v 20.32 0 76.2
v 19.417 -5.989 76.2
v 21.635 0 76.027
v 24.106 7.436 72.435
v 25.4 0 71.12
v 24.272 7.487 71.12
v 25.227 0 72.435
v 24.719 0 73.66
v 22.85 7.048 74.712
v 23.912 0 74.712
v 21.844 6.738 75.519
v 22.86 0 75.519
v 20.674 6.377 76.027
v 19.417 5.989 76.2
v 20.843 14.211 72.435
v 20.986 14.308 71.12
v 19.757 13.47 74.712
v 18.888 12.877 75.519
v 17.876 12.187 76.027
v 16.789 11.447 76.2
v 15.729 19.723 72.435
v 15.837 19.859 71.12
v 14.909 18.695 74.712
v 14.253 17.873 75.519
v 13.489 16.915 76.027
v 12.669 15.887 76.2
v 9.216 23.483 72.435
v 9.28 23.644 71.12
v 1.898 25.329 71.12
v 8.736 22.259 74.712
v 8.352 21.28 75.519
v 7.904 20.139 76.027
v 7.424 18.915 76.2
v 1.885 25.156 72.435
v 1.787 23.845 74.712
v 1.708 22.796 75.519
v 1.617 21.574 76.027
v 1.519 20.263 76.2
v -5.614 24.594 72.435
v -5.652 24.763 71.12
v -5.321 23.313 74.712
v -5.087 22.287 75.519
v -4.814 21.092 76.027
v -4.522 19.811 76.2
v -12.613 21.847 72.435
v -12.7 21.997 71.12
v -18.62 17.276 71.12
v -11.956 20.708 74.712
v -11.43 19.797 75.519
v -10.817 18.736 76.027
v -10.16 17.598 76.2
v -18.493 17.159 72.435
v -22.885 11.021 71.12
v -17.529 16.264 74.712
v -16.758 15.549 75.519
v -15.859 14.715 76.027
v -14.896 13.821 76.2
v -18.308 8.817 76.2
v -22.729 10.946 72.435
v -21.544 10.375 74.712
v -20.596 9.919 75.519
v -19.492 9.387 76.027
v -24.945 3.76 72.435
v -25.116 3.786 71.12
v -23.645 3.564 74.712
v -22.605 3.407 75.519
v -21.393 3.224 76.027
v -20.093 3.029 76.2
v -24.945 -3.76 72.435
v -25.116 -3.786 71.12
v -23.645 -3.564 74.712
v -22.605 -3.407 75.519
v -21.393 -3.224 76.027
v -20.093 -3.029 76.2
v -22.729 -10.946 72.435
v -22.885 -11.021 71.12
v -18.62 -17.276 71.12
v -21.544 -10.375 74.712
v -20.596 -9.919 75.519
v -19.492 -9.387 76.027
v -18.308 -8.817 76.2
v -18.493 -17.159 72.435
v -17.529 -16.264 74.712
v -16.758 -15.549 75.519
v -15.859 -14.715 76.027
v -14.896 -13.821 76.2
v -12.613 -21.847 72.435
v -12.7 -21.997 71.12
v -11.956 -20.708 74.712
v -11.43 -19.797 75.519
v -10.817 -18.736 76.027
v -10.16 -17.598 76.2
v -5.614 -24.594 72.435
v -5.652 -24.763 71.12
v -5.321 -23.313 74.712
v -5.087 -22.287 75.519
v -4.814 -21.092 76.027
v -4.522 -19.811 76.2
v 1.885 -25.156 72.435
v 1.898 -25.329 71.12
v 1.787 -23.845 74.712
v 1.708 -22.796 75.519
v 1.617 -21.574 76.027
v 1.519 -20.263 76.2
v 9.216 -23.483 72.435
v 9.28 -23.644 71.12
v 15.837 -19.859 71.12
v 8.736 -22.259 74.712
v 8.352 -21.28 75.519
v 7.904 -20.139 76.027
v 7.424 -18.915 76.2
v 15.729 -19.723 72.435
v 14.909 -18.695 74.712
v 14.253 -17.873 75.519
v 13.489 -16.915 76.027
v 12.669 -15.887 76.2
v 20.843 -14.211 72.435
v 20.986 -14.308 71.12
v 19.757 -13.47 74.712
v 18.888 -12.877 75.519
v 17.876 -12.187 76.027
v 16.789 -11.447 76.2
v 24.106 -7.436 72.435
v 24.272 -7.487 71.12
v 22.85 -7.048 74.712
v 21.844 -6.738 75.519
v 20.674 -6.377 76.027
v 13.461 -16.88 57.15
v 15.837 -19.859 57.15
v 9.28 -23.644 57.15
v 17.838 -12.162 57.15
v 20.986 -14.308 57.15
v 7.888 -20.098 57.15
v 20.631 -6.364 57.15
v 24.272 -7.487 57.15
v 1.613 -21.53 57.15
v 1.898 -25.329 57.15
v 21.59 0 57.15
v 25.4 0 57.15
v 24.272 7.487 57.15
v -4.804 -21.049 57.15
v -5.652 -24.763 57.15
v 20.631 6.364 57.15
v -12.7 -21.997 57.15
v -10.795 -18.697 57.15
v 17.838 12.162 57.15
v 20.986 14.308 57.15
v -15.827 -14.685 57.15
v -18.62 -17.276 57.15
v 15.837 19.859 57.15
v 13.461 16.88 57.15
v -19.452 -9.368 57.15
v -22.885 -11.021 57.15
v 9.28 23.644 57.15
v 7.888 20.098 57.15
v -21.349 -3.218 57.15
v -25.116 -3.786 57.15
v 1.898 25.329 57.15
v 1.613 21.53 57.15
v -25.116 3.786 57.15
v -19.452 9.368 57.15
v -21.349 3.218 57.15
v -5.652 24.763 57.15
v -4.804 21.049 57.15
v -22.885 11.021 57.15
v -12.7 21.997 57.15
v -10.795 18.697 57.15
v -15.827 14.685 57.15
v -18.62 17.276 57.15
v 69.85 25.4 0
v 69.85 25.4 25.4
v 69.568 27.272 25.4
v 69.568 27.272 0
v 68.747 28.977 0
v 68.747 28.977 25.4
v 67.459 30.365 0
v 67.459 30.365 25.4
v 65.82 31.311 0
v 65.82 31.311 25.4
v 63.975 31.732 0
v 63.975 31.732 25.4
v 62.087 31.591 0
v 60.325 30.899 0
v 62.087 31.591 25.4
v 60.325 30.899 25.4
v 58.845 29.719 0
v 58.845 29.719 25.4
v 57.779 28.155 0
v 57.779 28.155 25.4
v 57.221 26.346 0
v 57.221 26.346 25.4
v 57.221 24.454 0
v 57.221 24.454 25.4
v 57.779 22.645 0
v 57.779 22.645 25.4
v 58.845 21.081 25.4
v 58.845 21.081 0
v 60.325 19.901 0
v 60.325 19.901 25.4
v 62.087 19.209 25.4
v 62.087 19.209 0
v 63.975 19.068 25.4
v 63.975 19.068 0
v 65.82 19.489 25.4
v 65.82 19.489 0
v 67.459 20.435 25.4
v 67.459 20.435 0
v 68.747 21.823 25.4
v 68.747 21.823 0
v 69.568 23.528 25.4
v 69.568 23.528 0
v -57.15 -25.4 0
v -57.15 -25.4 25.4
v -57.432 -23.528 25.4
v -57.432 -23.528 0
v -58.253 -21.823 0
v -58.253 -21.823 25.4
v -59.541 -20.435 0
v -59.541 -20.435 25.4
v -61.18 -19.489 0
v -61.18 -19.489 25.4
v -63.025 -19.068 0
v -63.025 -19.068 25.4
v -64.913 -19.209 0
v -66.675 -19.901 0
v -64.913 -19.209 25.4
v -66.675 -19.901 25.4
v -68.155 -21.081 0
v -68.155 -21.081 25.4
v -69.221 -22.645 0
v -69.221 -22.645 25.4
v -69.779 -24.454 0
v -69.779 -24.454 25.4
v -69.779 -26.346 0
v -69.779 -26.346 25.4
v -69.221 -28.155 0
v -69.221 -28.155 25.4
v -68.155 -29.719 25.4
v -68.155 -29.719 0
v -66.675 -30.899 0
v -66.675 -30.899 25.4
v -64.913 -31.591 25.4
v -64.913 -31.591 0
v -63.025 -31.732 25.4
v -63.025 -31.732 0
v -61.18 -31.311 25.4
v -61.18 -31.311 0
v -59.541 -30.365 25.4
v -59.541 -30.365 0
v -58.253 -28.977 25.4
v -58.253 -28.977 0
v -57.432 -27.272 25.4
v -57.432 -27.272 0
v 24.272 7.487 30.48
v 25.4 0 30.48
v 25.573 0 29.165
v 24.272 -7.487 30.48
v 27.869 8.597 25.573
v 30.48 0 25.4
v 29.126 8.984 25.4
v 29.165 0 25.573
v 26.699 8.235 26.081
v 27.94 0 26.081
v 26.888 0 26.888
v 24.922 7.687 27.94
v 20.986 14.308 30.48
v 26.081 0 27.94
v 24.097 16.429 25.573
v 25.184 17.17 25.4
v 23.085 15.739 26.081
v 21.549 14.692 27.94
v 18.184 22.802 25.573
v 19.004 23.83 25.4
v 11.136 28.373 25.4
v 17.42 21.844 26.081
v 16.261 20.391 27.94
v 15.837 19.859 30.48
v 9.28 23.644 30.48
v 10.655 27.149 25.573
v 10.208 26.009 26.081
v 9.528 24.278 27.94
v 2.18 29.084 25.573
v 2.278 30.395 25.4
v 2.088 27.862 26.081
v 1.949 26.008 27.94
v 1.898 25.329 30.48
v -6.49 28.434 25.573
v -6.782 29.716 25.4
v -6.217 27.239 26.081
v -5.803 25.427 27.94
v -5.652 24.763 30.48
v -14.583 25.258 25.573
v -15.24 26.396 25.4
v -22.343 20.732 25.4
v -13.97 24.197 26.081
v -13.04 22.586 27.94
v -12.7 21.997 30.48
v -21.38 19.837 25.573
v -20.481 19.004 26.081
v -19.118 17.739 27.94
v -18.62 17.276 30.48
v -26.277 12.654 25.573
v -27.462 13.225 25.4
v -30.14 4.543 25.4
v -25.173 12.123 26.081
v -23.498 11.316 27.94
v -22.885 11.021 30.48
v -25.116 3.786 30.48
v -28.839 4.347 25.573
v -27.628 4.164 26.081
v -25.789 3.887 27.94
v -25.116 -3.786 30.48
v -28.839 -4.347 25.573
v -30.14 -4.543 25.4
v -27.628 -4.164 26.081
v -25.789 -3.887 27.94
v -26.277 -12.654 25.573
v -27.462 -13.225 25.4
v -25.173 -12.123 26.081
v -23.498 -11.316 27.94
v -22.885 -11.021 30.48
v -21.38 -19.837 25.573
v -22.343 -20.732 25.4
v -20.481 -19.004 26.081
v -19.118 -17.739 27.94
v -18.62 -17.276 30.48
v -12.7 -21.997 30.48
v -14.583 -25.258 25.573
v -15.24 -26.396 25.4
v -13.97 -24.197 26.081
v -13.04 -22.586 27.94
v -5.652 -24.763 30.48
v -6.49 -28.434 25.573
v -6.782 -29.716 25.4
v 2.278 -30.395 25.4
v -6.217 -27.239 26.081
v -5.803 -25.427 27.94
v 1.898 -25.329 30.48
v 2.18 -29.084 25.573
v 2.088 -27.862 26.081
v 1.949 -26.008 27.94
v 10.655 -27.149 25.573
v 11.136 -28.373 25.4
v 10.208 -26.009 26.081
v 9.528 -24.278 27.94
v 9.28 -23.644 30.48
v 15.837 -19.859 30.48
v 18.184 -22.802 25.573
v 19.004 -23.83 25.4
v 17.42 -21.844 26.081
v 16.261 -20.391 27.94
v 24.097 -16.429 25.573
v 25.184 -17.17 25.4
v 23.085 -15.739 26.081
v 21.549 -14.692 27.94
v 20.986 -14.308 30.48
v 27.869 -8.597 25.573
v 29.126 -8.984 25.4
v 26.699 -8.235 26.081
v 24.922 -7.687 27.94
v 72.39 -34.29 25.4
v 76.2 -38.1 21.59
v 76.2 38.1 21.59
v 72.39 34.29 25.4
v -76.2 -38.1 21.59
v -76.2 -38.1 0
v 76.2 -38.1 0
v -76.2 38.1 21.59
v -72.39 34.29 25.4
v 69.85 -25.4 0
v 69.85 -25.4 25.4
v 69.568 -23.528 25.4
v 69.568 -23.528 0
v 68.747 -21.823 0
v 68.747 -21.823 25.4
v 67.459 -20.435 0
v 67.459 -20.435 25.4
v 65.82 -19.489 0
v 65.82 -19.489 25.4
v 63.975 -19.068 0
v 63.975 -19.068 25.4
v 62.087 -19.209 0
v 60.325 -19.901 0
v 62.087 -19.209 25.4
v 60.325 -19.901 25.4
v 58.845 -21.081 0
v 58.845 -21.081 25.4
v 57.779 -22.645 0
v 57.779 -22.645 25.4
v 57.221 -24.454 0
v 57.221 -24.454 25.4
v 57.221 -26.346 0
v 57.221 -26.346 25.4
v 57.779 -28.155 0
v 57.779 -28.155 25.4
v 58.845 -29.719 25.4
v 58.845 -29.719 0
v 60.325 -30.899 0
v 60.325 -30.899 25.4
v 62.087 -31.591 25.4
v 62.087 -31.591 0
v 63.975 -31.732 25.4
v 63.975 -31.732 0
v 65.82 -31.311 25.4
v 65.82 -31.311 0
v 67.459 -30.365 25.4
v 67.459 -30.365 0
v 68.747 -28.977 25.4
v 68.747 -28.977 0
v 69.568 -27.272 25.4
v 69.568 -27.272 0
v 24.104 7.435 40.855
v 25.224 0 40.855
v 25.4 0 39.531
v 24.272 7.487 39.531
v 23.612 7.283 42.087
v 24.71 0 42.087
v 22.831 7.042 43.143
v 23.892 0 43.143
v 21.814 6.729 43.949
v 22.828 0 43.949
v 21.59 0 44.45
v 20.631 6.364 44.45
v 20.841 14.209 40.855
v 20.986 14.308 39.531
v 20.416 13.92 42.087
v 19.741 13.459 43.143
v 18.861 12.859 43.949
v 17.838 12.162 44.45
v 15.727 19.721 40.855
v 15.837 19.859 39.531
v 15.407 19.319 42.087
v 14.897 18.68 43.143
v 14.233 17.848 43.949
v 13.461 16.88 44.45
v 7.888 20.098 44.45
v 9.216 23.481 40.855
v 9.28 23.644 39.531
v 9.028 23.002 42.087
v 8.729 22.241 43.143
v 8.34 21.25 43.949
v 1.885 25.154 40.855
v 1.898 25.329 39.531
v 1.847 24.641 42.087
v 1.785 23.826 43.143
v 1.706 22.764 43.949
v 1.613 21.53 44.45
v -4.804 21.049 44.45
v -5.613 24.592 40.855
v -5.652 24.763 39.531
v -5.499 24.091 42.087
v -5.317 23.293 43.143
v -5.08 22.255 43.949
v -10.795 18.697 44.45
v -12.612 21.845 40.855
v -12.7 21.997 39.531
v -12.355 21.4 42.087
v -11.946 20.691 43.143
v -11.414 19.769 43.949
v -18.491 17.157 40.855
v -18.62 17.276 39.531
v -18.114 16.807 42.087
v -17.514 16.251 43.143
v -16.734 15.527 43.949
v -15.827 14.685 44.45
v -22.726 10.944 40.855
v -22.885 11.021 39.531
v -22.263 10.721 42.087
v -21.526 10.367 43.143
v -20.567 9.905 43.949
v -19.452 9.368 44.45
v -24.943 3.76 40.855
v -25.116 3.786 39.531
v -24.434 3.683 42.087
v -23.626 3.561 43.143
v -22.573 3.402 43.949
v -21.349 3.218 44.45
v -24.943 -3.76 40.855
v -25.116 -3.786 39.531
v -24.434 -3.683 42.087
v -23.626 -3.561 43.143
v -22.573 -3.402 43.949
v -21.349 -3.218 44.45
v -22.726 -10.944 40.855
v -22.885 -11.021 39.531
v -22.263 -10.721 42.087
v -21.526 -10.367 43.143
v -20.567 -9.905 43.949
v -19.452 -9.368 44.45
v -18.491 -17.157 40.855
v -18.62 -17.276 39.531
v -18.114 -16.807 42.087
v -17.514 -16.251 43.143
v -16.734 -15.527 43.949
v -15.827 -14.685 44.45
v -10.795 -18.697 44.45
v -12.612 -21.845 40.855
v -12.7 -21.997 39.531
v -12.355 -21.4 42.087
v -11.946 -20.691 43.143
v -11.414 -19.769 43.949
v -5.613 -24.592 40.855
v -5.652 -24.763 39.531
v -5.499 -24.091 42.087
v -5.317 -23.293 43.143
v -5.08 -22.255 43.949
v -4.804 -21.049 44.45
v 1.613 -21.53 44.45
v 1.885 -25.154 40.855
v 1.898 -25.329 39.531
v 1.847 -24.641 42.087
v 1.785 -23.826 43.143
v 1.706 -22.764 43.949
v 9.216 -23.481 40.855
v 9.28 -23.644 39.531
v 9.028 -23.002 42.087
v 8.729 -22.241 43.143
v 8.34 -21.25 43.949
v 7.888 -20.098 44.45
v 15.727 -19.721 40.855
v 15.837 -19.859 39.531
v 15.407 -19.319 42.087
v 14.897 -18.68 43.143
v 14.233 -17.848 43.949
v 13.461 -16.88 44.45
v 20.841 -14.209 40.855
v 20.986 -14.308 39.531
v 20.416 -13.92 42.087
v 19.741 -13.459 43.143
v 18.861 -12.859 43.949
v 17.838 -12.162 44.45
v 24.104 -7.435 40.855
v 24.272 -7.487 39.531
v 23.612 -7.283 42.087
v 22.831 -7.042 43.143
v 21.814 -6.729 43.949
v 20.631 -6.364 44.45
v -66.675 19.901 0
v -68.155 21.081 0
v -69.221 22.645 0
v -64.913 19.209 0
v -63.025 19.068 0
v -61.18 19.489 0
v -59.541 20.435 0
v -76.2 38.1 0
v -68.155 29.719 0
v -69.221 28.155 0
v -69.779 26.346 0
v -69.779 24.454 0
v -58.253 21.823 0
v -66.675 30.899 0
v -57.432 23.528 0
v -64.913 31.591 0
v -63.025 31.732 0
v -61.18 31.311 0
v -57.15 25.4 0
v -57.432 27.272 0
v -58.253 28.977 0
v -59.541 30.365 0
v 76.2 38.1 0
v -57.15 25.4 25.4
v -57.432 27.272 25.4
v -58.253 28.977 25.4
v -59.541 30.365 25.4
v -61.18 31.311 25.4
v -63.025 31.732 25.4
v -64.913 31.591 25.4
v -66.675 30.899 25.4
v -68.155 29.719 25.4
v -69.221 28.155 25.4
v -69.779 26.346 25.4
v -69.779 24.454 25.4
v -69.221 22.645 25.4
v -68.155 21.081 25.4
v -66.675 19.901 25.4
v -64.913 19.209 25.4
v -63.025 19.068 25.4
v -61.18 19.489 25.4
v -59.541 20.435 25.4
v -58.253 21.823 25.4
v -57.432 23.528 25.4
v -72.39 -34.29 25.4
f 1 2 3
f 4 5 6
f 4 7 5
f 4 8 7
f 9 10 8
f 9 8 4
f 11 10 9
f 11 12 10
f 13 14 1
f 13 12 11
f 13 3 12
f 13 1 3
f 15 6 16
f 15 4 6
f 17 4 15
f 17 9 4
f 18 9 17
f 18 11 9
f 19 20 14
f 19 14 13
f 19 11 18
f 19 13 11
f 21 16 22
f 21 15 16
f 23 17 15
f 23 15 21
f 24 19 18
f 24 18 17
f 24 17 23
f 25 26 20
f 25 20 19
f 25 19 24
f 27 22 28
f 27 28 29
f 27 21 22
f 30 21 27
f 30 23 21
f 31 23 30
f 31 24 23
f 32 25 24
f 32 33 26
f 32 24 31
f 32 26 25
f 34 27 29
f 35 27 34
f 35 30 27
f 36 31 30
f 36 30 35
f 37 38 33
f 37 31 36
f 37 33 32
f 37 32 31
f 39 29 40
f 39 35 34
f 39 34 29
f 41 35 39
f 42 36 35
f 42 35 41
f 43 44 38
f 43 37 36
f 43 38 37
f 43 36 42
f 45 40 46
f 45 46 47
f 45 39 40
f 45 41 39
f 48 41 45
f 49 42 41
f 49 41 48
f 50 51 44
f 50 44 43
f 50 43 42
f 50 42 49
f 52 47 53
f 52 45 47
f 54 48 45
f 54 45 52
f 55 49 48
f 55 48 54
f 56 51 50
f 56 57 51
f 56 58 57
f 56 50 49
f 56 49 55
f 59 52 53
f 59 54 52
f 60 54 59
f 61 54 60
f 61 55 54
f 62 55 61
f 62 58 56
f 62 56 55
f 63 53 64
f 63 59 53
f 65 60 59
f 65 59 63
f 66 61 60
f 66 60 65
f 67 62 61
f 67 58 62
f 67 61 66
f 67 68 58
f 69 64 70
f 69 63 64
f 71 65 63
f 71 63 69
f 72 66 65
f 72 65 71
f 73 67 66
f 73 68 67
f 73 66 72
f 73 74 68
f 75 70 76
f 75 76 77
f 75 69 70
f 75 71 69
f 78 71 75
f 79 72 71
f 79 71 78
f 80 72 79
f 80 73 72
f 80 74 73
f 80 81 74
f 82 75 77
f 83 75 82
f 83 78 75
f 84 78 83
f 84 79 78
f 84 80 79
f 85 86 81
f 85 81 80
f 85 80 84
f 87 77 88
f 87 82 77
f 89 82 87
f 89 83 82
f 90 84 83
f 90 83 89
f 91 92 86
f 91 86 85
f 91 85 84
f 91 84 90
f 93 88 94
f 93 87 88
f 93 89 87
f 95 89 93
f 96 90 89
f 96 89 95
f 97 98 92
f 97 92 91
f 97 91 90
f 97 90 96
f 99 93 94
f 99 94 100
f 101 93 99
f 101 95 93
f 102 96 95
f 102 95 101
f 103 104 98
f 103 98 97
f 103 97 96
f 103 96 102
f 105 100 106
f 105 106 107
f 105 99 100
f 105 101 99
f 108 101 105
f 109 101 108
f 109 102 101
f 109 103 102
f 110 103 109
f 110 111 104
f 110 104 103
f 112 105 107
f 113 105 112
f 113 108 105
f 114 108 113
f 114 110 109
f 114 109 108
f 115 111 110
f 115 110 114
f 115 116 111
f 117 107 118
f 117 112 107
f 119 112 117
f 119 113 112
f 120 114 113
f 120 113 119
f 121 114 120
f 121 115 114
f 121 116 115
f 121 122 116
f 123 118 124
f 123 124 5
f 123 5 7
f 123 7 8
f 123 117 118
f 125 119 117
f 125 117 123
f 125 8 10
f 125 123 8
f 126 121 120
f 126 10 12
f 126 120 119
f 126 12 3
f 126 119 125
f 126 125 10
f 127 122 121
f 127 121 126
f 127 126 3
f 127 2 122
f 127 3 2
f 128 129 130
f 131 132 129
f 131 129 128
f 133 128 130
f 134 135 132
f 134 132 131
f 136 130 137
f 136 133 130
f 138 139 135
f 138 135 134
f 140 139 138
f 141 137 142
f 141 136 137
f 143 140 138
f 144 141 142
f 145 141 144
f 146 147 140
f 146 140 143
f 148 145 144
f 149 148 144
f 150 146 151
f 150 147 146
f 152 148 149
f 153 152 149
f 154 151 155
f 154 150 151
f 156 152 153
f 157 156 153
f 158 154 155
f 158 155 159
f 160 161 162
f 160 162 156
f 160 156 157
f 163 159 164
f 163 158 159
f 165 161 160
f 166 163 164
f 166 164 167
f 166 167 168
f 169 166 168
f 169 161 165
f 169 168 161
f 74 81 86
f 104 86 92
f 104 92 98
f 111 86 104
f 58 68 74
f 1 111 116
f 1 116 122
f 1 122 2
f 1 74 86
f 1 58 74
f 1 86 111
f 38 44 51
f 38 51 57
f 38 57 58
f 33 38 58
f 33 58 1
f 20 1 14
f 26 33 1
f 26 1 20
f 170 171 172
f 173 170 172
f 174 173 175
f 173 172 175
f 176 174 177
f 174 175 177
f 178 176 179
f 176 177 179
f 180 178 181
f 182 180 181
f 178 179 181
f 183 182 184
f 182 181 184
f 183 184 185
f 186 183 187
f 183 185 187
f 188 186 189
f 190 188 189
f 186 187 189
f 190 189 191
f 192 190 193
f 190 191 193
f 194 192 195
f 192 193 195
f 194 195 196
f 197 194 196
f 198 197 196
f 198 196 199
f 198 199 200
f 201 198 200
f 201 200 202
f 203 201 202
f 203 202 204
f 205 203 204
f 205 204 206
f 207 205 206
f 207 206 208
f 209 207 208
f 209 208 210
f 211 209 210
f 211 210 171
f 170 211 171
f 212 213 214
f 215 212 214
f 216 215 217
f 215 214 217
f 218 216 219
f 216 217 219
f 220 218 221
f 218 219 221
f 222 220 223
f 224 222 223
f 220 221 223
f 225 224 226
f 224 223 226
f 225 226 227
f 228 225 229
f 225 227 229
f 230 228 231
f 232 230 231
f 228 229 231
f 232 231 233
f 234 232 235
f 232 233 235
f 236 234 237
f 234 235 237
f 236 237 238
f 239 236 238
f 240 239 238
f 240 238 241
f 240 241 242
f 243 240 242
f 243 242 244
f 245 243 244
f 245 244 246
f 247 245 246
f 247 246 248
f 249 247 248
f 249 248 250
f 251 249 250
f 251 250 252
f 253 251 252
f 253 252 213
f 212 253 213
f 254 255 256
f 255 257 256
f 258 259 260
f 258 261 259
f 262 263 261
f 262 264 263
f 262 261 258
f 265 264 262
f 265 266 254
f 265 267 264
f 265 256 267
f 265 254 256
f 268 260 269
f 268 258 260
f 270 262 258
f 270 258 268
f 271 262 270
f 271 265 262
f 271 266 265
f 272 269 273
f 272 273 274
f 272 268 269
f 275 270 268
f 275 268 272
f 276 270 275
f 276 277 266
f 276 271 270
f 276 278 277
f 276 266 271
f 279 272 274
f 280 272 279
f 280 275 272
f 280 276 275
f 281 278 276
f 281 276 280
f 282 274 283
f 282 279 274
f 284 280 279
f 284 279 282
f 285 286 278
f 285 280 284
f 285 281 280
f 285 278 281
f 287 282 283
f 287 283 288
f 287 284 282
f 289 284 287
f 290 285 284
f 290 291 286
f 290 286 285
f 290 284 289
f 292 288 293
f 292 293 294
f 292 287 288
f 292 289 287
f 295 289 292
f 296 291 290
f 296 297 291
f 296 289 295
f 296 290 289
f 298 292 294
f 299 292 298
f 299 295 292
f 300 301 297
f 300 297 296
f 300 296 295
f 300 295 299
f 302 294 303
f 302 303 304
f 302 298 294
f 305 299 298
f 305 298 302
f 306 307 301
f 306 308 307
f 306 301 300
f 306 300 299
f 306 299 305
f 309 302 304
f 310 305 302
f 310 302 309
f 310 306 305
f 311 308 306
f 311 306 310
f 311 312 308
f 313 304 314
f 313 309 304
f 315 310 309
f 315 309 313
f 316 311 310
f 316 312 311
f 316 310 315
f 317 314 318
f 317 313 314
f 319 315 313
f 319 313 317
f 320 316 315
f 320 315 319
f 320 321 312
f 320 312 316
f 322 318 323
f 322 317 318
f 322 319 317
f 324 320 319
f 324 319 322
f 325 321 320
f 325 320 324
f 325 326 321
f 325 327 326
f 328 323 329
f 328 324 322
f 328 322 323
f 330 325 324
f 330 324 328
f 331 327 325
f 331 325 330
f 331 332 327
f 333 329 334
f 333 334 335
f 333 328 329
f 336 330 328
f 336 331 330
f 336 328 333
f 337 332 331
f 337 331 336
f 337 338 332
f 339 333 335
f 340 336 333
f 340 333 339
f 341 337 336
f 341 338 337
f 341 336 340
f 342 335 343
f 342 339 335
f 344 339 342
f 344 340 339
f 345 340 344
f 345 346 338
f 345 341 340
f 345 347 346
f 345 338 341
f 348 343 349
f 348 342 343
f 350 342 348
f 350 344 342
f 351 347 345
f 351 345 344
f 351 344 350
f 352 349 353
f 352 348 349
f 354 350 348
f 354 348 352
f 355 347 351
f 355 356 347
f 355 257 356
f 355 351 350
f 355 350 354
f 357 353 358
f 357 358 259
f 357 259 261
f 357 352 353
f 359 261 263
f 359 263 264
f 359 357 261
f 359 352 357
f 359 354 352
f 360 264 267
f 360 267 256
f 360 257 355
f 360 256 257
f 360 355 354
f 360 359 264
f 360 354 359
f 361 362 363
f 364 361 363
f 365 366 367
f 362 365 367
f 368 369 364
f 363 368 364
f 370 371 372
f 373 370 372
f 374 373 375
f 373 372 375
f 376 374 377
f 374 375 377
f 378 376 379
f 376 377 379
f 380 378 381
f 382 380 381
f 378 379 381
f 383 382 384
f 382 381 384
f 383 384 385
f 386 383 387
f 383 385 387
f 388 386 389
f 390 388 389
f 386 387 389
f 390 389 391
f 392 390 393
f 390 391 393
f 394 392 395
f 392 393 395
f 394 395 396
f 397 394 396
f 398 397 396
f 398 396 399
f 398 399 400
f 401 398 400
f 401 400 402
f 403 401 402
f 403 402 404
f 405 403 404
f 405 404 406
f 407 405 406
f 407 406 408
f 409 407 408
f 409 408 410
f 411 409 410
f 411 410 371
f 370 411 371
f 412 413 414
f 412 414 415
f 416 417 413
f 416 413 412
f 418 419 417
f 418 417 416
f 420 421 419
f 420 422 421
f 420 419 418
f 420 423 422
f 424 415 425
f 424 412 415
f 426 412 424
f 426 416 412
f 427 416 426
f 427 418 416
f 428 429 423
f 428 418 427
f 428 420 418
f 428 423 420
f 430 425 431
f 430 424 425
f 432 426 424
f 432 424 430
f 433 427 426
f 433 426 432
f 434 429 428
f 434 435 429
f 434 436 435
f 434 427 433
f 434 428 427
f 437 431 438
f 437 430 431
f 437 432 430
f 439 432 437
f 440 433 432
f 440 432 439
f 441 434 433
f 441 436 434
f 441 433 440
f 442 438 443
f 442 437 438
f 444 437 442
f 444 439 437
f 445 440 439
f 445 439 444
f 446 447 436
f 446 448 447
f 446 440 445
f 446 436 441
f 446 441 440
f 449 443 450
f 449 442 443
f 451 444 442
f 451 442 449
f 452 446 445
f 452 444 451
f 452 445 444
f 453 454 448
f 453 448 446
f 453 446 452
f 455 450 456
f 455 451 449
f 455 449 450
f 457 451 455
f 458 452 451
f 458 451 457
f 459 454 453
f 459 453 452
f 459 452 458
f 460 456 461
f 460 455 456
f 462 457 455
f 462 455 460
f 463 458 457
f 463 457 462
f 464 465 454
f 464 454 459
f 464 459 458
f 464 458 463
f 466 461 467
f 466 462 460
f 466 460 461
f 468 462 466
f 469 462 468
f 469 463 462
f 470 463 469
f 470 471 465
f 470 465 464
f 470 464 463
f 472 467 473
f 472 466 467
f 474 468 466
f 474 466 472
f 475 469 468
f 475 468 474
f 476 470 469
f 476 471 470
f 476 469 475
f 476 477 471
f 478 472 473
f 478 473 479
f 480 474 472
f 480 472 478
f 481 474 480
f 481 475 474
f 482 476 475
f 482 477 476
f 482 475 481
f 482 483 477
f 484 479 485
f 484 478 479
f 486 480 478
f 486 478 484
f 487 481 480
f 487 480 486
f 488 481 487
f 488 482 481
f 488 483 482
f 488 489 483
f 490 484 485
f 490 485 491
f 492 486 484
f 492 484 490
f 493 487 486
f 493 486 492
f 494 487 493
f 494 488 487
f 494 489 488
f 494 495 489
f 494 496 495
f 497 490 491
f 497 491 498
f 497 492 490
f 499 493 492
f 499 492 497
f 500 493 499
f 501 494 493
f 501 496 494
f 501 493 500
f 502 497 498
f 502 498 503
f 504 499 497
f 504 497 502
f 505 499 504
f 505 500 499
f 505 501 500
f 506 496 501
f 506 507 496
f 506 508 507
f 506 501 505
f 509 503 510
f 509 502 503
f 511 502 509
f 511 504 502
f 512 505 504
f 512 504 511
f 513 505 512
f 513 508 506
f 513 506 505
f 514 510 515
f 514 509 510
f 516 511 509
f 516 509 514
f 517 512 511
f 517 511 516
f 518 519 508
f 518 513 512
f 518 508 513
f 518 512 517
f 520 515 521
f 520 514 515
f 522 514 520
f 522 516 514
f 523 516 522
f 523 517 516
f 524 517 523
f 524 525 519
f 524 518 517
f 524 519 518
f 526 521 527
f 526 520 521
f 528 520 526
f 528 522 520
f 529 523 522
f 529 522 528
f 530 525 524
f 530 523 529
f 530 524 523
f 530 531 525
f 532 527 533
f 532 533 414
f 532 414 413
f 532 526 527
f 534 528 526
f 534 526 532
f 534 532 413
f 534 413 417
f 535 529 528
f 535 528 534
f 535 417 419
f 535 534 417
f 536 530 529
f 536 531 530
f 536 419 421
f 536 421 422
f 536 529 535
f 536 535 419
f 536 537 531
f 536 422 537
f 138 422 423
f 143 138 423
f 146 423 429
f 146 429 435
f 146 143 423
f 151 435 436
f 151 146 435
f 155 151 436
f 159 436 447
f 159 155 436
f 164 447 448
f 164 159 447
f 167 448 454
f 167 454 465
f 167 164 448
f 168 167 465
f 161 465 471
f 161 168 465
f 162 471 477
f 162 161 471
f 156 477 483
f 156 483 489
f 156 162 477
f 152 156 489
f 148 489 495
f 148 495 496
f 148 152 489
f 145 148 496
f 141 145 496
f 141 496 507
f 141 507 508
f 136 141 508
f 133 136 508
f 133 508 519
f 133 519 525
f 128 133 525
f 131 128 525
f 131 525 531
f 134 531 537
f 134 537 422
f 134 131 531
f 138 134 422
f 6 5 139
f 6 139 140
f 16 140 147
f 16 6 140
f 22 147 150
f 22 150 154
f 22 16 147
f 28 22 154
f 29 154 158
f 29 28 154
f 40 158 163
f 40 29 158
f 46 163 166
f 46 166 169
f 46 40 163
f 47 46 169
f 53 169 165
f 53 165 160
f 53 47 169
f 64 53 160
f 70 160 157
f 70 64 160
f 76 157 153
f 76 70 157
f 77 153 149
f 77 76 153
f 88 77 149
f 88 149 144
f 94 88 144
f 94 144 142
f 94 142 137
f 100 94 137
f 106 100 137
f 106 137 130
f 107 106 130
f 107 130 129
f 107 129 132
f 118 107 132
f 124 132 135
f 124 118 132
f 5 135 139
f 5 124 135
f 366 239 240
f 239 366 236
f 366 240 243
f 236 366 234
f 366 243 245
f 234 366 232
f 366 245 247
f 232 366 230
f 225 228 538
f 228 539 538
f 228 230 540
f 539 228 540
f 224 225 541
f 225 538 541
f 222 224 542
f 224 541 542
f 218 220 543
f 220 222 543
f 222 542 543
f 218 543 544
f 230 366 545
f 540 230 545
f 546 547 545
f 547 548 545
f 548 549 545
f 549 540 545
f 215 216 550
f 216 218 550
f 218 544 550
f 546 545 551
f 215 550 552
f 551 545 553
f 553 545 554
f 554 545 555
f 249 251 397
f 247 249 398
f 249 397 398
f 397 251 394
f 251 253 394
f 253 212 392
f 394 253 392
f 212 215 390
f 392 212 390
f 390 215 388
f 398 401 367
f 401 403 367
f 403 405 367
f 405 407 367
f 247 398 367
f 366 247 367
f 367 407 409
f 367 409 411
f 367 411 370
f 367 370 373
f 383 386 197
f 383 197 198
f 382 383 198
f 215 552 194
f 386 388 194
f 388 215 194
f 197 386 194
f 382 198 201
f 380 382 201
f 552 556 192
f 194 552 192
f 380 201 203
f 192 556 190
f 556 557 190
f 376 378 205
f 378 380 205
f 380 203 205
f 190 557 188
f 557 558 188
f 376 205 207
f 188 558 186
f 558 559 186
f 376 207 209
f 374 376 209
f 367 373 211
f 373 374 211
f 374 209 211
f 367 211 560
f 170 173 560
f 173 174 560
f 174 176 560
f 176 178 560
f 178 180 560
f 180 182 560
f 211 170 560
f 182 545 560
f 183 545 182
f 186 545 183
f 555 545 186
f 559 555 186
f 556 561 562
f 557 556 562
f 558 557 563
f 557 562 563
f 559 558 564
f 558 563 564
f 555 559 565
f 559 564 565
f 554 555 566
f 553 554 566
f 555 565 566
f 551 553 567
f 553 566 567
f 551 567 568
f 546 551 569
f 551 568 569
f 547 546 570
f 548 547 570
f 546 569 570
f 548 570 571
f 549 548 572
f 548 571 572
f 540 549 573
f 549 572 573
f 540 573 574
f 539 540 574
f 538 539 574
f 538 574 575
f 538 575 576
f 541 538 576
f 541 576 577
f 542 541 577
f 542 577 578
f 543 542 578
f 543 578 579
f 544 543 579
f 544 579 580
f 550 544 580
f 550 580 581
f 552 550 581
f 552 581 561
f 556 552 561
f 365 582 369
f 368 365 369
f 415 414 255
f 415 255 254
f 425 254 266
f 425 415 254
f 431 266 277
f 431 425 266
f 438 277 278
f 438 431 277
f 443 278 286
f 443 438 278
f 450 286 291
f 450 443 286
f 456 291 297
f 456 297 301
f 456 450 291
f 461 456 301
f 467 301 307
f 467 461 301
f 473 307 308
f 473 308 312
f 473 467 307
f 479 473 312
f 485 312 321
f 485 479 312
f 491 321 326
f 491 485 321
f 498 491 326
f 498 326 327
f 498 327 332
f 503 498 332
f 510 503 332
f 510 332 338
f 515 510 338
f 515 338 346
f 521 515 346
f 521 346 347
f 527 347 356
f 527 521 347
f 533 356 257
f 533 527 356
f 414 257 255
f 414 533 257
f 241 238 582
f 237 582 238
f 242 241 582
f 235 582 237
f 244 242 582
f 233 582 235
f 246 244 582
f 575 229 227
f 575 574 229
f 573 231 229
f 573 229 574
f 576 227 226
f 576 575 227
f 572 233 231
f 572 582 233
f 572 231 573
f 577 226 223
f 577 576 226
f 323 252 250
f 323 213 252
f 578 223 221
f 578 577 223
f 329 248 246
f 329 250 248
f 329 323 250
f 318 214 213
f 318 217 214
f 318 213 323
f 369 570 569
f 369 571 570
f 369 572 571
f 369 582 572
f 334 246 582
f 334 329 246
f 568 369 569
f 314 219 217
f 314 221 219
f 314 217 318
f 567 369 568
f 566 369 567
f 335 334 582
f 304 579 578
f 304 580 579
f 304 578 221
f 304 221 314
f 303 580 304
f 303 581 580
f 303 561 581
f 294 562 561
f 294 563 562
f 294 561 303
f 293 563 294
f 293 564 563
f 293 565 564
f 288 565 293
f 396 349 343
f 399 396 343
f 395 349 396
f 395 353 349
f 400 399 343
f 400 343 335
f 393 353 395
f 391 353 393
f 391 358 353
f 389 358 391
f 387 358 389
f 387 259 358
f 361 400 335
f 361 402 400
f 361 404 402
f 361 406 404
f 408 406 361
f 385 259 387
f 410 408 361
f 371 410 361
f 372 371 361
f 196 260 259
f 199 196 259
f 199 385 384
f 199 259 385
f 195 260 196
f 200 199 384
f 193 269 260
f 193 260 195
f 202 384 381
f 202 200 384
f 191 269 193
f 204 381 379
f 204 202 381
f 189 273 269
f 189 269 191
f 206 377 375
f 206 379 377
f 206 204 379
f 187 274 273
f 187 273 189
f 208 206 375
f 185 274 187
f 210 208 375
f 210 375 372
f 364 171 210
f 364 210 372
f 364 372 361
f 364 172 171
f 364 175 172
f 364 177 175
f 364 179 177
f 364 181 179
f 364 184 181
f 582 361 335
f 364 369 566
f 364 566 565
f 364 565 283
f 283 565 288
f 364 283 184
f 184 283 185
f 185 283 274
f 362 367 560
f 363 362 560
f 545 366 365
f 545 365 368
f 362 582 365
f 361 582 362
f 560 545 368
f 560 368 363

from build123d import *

# Parameters (mm, degrees)
F0_W     = 152.4
F0_H     = 76.2
F1_DEPTH = 25.4
F2_R     = 6.35
F3_DEPTH = 25.401
F4_SIZE  = 3.81


# Not quite as in the source:
# - a fillet or chamfer that OpenCascade refuses, or shapes differently, is made with other operations: its cross-section is extruded or revolved along the edge and cut away or added


with BuildPart() as f1:
    # F0 (on Top) → F1 (new body)
    with BuildSketch(Plane.XY):
        Rectangle(F0_W, F0_H)
    extrude(amount=F1_DEPTH)

    # F2 (on face) → F3 (cut, through all)
    with BuildSketch(Plane.XY.offset(25.4)):
        with Locations((-63.5, 25.4)):
            Circle(F2_R)
        with Locations((63.5, 25.4)):
            Circle(F2_R)
        with Locations((63.5, -25.4)):
            Circle(F2_R)
        with Locations((-63.5, -25.4)):
            Circle(F2_R)
    extrude(amount=-F3_DEPTH, mode=Mode.SUBTRACT)

    # F4
    f4_edges = [f1.edges().sort_by_distance(p)[0] for p in [
        (0, -38.1, 25.4),
        (-76.2, 0, 25.4),
        (0, 38.1, 25.4),
        (76.2, 0, 25.4),
    ]]
    chamfer(f4_edges, length=F4_SIZE)

    # F5 (on Front) → F6 (revolve)
    with BuildSketch(Plane.XZ):
        Polygon((0, 76.2), (0, 25.4), (25.4, 25.4), (25.4, 44.45), (21.59, 44.45), (21.59, 57.15), (25.4, 57.15), (25.4, 76.2), align=None)
    revolve(axis=Axis((0, 0, 50.8), (0, 0, 1)))

    # F7: fillet of radius 5.08 on 3 edges, made by hand

    # F7_s1 → F7_t2 (revolve)
    with BuildSketch(Plane.XZ):
        with BuildLine():
            ThreePointArc((30.48, 25.4), (26.8878975516, 26.8878975516), (25.4, 30.48))
            Line((25.4, 30.48), (25.4, 25.4))
            Line((25.4, 25.4), (30.48, 25.4))
        make_face()
    revolve(axis=Axis((0, 0, 25.4), (0, 0, 1)))

    # F7_s3 → F7_t4 (revolve, cut)
    with BuildSketch(Plane.XZ):
        with BuildLine():
            ThreePointArc((25.4, 39.5313111503), (24.3360926284, 42.6421631237), (21.59, 44.45))
            Line((21.59, 44.45), (25.4, 44.45))
            Line((25.4, 44.45), (25.4, 39.5313111503))
        make_face()
    revolve(axis=Axis((0, 0, 44.45), (0, 0, 1)), mode=Mode.SUBTRACT)

    # F7_s5 → F7_t6 (revolve, cut)
    with BuildSketch(Plane.XZ):
        with BuildLine():
            ThreePointArc((25.4, 71.12), (23.9121024484, 74.7121024484), (20.32, 76.2))
            Line((20.32, 76.2), (25.4, 76.2))
            Line((25.4, 76.2), (25.4, 71.12))
        make_face()
    revolve(axis=Axis((0, 0, 76.2), (0, 0, 1)), mode=Mode.SUBTRACT)


solid = f1.part
